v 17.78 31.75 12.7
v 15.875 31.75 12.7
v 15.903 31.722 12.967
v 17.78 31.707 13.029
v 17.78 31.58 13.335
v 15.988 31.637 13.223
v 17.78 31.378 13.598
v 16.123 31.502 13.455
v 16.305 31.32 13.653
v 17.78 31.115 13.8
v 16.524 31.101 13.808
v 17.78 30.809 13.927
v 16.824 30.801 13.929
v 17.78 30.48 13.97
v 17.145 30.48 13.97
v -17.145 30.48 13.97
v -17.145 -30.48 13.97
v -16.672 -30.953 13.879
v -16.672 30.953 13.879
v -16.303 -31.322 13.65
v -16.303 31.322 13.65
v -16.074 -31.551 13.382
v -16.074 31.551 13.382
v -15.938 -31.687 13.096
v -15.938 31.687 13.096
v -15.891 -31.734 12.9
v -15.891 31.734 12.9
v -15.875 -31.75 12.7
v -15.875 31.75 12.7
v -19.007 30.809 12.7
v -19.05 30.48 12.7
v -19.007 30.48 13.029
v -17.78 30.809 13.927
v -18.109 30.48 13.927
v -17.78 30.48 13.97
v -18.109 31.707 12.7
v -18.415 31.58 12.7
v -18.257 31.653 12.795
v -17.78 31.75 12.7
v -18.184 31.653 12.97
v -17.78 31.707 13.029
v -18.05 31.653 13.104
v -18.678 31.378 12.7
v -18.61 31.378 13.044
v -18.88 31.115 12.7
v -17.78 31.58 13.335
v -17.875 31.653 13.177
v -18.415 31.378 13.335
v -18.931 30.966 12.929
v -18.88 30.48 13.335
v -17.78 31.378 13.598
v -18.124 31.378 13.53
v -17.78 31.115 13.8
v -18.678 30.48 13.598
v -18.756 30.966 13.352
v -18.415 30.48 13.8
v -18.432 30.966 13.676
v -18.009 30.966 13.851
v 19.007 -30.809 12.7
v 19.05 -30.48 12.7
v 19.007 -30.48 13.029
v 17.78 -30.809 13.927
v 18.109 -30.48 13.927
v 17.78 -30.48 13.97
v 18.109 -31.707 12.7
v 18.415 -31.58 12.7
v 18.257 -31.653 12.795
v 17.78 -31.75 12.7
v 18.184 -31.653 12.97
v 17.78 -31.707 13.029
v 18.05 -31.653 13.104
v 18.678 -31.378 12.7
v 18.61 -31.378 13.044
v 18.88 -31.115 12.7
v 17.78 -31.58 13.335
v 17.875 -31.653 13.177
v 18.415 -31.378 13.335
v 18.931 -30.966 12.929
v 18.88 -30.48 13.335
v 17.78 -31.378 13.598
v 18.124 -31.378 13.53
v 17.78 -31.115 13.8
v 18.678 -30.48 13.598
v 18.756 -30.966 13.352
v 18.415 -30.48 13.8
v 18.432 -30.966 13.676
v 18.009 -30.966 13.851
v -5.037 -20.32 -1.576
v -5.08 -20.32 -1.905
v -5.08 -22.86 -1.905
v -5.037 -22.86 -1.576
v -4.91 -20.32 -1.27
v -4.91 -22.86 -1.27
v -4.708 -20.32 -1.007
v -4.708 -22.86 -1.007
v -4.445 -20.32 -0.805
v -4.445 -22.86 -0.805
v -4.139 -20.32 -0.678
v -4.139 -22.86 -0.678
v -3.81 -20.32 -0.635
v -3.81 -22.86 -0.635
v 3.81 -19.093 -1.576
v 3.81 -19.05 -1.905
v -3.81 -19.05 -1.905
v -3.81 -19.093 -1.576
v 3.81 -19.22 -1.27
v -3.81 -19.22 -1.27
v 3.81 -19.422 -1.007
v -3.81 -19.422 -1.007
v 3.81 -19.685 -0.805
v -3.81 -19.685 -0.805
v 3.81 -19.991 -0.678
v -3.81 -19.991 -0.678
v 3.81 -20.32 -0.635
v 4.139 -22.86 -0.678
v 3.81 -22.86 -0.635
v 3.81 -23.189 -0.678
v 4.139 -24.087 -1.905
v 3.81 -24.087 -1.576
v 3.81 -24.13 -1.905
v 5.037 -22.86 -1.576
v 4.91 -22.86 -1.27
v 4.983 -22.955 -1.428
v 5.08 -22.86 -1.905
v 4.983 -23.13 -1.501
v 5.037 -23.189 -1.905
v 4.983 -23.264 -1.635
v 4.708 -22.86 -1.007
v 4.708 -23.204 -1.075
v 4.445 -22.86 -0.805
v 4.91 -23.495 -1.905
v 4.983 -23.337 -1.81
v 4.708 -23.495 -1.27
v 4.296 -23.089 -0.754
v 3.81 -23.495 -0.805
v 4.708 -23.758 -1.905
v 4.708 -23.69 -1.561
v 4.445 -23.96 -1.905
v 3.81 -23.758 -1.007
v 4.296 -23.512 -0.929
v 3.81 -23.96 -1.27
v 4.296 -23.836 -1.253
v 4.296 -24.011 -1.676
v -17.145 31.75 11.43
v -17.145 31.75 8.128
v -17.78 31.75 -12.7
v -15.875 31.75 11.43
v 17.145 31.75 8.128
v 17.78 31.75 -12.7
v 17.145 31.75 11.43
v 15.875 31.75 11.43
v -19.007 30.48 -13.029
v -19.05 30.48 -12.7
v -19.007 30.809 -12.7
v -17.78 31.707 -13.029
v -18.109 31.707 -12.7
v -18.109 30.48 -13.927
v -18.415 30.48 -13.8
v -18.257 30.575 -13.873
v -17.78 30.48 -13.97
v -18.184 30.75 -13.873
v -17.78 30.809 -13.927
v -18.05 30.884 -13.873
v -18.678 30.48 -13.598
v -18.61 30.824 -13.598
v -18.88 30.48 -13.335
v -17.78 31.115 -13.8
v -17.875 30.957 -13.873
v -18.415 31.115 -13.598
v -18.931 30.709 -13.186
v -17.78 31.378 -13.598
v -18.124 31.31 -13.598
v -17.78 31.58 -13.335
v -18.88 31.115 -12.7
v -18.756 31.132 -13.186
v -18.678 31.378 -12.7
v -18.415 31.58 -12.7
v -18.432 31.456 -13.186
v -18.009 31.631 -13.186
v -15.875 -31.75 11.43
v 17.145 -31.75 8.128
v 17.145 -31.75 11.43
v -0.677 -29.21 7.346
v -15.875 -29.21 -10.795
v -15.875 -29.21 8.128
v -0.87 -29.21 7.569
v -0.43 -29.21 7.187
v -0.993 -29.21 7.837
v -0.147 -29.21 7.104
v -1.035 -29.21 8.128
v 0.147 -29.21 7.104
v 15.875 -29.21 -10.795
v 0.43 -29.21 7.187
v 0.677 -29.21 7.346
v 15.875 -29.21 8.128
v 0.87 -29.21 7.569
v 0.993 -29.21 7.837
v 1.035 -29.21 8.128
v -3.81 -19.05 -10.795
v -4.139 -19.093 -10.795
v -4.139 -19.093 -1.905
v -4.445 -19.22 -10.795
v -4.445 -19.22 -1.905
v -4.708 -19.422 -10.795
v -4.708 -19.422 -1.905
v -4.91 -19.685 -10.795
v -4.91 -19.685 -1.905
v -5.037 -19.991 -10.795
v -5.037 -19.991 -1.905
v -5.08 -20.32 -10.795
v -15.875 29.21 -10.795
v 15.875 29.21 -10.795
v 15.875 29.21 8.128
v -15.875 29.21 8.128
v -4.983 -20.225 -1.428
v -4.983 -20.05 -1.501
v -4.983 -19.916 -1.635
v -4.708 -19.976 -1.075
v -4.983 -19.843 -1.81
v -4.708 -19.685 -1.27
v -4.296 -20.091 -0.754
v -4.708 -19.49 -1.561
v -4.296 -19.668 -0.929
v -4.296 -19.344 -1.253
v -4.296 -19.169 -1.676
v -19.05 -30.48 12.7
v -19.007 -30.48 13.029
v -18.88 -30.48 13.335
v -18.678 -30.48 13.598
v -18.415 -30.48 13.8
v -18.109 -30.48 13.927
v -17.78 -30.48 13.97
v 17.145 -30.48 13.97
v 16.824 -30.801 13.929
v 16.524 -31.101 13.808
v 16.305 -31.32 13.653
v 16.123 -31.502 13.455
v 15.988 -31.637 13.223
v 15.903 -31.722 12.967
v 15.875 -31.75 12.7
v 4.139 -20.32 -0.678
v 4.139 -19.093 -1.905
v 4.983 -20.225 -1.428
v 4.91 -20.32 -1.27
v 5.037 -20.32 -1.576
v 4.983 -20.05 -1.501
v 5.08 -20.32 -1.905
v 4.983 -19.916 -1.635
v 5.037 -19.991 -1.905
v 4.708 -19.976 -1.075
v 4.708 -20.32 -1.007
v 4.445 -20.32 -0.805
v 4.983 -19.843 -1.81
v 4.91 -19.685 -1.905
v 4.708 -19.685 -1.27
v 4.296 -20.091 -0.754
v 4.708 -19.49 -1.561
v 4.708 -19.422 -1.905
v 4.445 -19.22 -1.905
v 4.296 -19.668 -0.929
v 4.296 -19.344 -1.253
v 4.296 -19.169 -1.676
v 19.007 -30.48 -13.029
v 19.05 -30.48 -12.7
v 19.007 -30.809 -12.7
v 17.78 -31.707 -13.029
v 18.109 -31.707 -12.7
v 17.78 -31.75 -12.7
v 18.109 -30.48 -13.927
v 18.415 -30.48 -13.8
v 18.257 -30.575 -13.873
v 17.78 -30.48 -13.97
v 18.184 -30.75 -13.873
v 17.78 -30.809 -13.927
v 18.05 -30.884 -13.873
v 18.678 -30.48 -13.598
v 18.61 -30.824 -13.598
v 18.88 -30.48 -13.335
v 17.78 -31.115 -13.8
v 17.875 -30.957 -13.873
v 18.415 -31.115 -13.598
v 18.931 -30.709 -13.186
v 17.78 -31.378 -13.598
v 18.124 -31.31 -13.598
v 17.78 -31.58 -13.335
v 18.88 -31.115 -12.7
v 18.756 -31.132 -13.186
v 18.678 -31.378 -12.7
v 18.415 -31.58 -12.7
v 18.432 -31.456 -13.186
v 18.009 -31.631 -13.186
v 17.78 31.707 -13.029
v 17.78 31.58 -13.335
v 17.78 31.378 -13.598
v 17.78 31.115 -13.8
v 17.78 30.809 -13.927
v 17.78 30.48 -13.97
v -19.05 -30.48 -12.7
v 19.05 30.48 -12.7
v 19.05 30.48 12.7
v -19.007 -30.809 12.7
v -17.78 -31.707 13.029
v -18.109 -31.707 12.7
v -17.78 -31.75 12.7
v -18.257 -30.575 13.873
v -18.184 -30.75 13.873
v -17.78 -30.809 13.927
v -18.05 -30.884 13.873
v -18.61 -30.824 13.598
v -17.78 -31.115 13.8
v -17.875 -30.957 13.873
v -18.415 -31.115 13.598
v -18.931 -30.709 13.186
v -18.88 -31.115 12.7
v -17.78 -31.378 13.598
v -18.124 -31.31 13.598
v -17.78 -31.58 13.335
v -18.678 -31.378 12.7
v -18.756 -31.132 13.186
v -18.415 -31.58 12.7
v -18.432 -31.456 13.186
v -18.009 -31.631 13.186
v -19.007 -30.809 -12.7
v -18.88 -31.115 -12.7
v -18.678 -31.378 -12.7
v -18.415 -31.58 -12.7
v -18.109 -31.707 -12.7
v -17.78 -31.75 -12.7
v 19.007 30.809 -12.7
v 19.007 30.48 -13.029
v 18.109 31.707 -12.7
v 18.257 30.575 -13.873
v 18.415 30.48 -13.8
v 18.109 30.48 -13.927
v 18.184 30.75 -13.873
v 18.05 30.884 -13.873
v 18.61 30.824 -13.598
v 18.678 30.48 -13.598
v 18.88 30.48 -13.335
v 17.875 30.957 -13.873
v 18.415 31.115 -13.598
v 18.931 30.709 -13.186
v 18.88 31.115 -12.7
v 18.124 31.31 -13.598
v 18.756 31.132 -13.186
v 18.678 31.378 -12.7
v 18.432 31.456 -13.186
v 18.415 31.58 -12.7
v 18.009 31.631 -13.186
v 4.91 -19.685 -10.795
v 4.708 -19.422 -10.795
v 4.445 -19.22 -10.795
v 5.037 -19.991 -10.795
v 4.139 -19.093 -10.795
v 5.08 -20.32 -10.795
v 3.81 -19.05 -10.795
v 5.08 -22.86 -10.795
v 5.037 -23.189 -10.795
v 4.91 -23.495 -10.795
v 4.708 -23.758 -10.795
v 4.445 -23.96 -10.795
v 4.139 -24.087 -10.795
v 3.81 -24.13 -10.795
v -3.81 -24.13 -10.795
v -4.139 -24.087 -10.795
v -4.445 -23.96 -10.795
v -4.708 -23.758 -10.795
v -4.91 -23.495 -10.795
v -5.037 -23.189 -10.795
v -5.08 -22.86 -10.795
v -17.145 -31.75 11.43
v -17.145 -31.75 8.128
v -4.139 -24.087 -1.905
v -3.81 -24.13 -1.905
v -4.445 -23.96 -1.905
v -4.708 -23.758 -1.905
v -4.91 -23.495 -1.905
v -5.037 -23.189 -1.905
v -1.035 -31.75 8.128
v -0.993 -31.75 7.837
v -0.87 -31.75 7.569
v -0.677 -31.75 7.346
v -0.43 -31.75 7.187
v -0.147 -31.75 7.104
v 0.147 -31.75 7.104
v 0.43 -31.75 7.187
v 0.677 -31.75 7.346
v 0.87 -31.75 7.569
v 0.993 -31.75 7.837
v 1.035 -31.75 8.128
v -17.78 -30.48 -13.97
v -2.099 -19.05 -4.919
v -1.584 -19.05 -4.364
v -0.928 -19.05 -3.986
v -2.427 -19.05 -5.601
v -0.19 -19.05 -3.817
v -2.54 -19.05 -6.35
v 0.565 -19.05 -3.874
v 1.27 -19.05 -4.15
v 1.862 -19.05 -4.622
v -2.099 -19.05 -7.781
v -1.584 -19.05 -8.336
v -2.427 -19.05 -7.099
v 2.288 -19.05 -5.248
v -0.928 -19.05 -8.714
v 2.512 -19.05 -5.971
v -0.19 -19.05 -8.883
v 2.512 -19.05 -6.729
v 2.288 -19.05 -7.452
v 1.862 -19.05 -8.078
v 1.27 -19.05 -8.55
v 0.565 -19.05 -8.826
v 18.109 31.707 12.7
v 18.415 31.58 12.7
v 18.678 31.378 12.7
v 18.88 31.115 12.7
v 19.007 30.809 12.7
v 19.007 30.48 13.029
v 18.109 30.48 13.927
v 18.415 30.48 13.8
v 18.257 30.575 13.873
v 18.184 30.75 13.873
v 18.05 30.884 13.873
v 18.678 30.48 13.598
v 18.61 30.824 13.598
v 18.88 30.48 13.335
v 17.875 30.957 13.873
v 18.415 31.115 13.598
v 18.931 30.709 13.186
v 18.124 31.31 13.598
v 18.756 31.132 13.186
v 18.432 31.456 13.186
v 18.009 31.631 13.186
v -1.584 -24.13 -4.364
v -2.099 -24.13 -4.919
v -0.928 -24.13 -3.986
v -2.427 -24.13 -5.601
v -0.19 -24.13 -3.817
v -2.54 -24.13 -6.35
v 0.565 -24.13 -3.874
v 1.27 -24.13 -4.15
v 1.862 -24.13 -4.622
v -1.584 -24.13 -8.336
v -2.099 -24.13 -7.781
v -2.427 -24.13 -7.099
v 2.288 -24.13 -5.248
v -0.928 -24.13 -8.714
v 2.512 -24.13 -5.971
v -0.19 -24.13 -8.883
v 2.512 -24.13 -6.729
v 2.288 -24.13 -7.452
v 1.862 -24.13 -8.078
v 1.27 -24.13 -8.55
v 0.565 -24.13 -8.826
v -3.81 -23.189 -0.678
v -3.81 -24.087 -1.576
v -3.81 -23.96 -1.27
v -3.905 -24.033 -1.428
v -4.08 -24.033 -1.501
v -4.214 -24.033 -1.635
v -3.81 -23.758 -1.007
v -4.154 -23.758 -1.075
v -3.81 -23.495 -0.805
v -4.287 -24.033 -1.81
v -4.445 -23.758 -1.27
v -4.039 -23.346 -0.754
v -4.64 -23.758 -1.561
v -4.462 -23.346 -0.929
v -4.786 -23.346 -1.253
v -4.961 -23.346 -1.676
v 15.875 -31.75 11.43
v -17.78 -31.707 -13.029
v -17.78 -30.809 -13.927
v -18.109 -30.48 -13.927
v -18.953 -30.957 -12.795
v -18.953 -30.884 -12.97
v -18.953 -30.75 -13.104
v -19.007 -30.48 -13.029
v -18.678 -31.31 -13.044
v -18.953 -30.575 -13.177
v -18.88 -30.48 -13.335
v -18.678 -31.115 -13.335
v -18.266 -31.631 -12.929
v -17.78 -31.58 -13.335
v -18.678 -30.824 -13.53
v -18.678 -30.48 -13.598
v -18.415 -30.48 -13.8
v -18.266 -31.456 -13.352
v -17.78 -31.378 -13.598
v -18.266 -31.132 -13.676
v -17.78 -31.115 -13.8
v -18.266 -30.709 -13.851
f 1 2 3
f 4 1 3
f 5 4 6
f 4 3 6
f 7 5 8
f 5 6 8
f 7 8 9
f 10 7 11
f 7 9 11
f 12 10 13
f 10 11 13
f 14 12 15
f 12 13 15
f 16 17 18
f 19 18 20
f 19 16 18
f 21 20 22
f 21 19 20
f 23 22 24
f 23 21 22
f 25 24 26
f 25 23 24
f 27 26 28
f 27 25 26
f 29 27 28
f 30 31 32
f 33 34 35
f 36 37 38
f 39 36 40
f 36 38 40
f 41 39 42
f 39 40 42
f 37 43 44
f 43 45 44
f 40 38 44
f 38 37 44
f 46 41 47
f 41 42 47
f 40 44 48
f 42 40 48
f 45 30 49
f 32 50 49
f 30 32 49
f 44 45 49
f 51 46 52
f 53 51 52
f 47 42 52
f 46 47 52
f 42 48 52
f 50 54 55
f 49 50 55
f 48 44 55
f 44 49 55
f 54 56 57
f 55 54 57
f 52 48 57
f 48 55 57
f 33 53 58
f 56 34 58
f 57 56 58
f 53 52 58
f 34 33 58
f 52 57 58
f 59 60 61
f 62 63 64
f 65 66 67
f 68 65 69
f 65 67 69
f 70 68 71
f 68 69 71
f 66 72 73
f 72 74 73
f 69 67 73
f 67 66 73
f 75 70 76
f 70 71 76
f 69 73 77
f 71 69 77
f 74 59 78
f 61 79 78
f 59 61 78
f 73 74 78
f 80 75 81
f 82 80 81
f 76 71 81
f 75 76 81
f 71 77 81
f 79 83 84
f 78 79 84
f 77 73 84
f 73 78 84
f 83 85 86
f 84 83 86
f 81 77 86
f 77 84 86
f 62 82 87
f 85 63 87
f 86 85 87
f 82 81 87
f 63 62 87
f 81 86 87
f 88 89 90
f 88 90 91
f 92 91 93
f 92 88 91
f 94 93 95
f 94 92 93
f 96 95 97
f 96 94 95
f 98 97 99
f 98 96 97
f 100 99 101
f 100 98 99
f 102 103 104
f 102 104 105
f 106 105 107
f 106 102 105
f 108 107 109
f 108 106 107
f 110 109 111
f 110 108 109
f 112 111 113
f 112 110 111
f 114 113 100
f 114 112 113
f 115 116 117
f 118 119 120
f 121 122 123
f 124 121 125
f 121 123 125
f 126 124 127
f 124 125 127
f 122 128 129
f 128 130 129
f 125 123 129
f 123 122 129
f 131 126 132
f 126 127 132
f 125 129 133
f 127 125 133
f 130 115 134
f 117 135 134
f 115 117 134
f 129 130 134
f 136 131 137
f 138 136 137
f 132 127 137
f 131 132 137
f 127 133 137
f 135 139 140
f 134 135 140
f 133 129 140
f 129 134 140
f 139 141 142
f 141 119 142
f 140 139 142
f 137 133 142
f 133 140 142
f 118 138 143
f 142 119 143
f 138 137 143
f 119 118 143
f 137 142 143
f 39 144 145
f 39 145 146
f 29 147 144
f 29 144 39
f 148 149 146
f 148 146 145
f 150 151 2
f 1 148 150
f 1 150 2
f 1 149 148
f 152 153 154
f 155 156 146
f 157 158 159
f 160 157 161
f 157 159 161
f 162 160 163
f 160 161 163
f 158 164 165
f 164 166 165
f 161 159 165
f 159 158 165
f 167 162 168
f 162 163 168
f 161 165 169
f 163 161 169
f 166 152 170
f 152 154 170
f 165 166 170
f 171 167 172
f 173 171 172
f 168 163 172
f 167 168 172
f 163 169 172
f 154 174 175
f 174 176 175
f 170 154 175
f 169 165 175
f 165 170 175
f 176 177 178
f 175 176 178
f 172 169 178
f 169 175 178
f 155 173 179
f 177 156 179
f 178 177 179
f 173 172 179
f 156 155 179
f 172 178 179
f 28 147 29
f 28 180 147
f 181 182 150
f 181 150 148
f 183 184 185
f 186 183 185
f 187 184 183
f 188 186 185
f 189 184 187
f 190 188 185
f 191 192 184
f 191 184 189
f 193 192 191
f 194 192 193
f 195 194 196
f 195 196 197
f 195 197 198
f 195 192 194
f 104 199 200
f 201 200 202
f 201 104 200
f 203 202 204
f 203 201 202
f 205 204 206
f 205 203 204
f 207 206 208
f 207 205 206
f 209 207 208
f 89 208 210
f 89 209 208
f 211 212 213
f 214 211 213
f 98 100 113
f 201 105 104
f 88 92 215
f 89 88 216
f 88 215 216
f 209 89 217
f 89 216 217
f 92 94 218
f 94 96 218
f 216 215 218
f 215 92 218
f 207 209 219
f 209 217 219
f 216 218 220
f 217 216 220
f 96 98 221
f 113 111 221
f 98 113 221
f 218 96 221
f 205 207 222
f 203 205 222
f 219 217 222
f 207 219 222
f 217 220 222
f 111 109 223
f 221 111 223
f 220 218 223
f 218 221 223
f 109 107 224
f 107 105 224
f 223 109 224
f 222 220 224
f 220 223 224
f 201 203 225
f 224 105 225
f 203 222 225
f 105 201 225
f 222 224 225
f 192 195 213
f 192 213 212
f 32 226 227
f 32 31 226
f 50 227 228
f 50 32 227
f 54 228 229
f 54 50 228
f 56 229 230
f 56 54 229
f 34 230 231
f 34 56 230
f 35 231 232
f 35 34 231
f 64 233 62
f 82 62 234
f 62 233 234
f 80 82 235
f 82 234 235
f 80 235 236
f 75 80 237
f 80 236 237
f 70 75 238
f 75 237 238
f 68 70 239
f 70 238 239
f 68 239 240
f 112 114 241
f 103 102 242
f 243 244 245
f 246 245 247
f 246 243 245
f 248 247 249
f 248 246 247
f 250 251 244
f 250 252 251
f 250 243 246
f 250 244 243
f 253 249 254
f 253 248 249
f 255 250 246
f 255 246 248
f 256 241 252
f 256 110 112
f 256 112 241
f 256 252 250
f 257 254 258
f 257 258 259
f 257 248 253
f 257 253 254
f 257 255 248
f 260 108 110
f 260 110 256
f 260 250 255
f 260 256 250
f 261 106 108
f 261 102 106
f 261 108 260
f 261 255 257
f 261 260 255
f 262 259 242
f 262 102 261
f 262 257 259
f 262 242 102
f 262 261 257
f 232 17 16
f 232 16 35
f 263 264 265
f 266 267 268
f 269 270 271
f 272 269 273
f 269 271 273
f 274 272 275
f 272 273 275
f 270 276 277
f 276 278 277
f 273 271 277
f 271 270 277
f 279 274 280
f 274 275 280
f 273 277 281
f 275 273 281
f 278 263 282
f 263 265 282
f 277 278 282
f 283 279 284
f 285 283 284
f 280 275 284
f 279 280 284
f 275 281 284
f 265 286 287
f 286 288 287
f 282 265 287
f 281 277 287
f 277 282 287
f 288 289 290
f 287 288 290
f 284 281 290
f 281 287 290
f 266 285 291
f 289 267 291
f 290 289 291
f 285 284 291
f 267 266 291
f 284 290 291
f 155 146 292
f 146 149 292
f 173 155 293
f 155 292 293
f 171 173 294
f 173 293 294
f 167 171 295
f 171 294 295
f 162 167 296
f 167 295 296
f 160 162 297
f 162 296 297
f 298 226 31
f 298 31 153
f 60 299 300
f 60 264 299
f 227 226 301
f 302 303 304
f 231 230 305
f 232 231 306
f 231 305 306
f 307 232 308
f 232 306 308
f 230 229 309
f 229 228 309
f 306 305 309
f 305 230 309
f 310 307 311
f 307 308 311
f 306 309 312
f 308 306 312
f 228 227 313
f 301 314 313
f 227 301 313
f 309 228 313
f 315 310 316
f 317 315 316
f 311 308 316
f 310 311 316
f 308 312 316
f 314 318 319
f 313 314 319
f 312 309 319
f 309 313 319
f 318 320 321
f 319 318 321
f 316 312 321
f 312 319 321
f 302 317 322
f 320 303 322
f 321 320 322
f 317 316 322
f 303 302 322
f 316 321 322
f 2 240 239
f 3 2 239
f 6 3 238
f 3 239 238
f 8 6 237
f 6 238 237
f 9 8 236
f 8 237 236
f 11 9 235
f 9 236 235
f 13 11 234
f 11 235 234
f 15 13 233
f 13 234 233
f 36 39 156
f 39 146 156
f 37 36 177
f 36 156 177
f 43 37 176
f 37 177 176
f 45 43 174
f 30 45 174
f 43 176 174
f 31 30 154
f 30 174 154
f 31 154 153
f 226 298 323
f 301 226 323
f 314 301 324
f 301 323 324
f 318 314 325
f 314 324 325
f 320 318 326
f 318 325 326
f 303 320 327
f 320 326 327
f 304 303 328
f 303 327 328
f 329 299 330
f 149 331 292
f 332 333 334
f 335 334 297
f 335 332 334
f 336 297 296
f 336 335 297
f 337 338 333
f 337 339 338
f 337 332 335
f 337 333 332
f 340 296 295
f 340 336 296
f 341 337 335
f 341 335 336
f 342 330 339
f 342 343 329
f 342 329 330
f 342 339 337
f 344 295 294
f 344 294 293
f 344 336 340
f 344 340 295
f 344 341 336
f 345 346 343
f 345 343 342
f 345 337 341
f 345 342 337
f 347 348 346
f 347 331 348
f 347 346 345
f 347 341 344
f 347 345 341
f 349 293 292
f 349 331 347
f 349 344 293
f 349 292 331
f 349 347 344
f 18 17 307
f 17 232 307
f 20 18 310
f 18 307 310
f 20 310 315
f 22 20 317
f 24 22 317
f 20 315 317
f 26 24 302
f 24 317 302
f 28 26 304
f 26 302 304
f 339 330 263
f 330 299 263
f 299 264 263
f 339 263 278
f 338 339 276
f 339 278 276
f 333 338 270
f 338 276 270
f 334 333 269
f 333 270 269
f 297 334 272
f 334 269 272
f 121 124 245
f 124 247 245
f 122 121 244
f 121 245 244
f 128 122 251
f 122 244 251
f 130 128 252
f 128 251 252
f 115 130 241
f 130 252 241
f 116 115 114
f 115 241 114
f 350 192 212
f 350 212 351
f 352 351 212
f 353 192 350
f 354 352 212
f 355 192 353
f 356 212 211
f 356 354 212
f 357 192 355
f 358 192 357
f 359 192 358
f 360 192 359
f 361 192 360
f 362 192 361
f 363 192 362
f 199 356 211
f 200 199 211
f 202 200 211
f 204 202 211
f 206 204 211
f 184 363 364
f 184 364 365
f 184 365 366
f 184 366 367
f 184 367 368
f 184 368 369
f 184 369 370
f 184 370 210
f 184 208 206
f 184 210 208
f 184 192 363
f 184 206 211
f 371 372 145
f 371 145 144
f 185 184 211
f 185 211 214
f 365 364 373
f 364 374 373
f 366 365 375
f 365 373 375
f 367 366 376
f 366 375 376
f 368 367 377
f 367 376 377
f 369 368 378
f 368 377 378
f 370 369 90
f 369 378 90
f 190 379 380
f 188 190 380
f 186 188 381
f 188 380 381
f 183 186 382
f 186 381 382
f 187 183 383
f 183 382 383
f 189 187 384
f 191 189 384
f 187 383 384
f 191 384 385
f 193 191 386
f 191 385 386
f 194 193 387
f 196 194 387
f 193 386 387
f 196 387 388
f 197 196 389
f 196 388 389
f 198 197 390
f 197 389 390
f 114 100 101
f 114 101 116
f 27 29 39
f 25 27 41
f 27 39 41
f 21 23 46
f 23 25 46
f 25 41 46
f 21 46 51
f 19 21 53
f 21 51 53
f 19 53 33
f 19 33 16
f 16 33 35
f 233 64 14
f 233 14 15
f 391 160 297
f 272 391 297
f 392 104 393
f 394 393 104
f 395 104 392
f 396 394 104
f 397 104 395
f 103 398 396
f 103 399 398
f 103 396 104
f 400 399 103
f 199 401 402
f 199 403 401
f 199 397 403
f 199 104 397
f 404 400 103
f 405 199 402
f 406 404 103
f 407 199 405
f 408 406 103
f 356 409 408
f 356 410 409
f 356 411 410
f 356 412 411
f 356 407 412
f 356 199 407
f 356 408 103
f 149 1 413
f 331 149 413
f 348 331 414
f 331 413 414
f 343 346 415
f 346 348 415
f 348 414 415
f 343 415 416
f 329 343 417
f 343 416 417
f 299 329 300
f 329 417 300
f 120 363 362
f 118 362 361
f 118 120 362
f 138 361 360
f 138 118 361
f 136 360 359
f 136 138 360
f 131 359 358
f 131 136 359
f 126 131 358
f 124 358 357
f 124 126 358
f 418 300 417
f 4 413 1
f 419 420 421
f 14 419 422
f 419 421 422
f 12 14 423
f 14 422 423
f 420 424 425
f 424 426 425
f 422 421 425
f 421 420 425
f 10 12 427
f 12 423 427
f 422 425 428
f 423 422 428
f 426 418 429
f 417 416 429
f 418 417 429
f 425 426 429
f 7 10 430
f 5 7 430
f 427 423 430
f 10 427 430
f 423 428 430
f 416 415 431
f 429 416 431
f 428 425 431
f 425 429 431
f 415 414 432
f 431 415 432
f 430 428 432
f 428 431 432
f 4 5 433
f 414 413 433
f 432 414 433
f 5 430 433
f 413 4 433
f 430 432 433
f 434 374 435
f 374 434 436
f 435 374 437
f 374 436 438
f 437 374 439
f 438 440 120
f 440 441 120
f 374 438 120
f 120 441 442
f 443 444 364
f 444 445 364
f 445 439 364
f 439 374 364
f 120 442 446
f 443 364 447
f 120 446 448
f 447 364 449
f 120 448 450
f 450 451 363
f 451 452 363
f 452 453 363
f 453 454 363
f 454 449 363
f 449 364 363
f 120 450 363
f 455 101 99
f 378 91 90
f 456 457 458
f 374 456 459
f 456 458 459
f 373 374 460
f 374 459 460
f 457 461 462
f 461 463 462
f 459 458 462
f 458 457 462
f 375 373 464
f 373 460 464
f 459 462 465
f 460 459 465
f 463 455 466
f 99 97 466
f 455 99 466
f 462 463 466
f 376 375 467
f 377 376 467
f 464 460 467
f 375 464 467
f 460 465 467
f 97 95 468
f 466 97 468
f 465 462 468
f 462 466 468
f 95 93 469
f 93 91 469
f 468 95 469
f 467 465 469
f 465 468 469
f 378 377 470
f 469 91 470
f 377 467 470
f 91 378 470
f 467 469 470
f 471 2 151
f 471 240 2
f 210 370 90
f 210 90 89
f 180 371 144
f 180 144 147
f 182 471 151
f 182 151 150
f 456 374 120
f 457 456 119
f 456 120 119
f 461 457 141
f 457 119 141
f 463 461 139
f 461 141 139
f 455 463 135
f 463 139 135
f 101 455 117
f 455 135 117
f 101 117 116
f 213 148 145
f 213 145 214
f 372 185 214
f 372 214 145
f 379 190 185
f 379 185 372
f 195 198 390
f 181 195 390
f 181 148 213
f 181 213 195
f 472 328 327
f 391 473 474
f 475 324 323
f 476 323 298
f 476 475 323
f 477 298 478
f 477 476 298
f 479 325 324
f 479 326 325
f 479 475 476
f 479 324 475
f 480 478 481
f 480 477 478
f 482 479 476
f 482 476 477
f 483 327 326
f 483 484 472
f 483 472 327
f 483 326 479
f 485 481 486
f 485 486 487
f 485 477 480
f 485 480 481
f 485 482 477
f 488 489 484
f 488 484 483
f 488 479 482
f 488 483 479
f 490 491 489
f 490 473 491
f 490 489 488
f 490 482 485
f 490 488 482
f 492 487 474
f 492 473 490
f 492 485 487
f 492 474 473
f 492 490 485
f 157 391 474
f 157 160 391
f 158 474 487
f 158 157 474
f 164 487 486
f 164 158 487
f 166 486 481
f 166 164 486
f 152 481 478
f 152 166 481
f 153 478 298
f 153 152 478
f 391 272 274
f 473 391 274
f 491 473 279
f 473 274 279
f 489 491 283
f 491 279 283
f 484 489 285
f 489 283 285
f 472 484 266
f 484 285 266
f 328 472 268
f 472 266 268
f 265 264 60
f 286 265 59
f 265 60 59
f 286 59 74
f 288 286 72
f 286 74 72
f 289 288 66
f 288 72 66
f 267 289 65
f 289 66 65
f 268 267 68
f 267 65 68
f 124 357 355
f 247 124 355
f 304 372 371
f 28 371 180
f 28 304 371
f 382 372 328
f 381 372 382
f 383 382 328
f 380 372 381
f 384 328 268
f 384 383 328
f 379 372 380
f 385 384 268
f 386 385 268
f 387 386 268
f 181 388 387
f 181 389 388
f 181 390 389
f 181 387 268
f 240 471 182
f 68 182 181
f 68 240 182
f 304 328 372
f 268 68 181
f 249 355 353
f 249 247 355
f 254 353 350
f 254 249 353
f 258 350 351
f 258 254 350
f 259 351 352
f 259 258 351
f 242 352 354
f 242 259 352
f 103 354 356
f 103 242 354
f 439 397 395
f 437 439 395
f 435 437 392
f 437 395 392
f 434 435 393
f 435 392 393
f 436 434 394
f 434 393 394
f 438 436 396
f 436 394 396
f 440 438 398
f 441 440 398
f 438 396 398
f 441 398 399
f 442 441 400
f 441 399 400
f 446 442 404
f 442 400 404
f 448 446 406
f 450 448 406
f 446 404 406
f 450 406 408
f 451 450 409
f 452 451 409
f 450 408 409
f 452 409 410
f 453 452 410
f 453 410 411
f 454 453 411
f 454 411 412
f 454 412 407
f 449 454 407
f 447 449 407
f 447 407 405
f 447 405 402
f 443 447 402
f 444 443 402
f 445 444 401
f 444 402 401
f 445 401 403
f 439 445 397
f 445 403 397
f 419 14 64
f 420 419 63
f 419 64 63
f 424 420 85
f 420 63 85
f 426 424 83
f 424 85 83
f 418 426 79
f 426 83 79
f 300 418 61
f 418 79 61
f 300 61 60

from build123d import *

# Parameters (mm, degrees)
F1_DEPTH  = 31.75
F2_W      = 2.54
F2_H      = 18.923
F3_DEPTH  = 31.75
F5_DEPTH  = 2.54
F6_W      = 10.16
F6_H      = 5.08
F7_DEPTH  = 10.16
F8_R      = 1.27
F9_R      = 2.54
F10_DEPTH = 5.08


with BuildPart() as f1:
    # F0 (on Front) → F1 (new body, symmetric)
    with BuildSketch(Plane.XZ):
        Polygon((-19.05, -13.97), (19.05, -13.97), (19.05, 13.97), (15.875, 13.97), (15.875, 11.43), (17.145, 11.43), (17.145, 8.128), (15.875, 8.128), (15.875, -10.795), (0, -10.795), (-15.875, -10.795), (-15.875, 8.128), (-17.145, 8.128), (-17.145, 11.43), (-15.875, 11.43), (-15.875, 13.97), (-19.05, 13.97), align=None)
    extrude(amount=F1_DEPTH, both=True)

    # F2 (on face) → F3 (join, through all)
    with BuildSketch(Plane(origin=(15.875, 0, 0), x_dir=(0, -1, 0), z_dir=(-1, 0, 0))):
        with Locations((-30.48, -1.3335)):
            Rectangle(F2_W, F2_H)
        with Locations((30.48, -1.3335)):
            Rectangle(F2_W, F2_H)
    extrude(amount=F3_DEPTH)

    # F4 (on face) → F5 (cut, through all)
    with BuildSketch(Plane.XZ.offset(31.75)):
        with BuildLine():
            ThreePointArc((-1.034546, 8.128), (0, 7.093454), (1.034546, 8.128))
            Line((1.034546, 8.128), (-1.034546, 8.128))
        make_face()
    extrude(amount=-F5_DEPTH, mode=Mode.SUBTRACT)

    # F6 (on face) → F7 (join)
    with BuildSketch(Plane.XY.offset(-10.795)):
        with Locations((0, -21.59)):
            Rectangle(F6_W, F6_H)
    extrude(amount=F7_DEPTH)

    # F8
    f8_edges = [f1.edges().sort_by_distance(p)[0] for p in [
        (19.05, 31.75, 0),
        (19.05, 0, 13.97),
        (19.05, -31.75, 0),
        (19.05, 0, -13.97),
        (0, -31.75, -13.97),
        (-19.05, -31.75, 0),
        (-19.05, 0, 13.97),
        (-19.05, 31.75, 0),
        (-19.05, 0, -13.97),
        (0, 31.75, -13.97),
        (0, -19.05, -0.635),
        (-5.08, -21.59, -0.635),
        (-5.08, -19.05, -5.715),
        (0, -24.13, -0.635),
        (5.08, -21.59, -0.635),
        (5.08, -24.13, -5.715),
        (5.08, -19.05, -5.715),
        (-5.08, -24.13, -5.715),
        (-15.875, 0, 13.97),
        (15.875, 0, 13.97),
        (17.4625, -31.75, 13.97),
        (-17.4625, -31.75, 13.97),
        (-17.4625, 31.75, 13.97),
        (17.4625, 31.75, 13.97),
    ]]
    fillet(f8_edges, radius=F8_R)

    # F9 (on face) → F10 (cut, through all)
    with BuildSketch(Plane(origin=(0, -19.05, 0), x_dir=(-1, 0, 0), z_dir=(0, 1, 0))):
        with Locations((0, -6.35)):
            Circle(F9_R)
    extrude(amount=-F10_DEPTH, mode=Mode.SUBTRACT)


solid = f1.part
